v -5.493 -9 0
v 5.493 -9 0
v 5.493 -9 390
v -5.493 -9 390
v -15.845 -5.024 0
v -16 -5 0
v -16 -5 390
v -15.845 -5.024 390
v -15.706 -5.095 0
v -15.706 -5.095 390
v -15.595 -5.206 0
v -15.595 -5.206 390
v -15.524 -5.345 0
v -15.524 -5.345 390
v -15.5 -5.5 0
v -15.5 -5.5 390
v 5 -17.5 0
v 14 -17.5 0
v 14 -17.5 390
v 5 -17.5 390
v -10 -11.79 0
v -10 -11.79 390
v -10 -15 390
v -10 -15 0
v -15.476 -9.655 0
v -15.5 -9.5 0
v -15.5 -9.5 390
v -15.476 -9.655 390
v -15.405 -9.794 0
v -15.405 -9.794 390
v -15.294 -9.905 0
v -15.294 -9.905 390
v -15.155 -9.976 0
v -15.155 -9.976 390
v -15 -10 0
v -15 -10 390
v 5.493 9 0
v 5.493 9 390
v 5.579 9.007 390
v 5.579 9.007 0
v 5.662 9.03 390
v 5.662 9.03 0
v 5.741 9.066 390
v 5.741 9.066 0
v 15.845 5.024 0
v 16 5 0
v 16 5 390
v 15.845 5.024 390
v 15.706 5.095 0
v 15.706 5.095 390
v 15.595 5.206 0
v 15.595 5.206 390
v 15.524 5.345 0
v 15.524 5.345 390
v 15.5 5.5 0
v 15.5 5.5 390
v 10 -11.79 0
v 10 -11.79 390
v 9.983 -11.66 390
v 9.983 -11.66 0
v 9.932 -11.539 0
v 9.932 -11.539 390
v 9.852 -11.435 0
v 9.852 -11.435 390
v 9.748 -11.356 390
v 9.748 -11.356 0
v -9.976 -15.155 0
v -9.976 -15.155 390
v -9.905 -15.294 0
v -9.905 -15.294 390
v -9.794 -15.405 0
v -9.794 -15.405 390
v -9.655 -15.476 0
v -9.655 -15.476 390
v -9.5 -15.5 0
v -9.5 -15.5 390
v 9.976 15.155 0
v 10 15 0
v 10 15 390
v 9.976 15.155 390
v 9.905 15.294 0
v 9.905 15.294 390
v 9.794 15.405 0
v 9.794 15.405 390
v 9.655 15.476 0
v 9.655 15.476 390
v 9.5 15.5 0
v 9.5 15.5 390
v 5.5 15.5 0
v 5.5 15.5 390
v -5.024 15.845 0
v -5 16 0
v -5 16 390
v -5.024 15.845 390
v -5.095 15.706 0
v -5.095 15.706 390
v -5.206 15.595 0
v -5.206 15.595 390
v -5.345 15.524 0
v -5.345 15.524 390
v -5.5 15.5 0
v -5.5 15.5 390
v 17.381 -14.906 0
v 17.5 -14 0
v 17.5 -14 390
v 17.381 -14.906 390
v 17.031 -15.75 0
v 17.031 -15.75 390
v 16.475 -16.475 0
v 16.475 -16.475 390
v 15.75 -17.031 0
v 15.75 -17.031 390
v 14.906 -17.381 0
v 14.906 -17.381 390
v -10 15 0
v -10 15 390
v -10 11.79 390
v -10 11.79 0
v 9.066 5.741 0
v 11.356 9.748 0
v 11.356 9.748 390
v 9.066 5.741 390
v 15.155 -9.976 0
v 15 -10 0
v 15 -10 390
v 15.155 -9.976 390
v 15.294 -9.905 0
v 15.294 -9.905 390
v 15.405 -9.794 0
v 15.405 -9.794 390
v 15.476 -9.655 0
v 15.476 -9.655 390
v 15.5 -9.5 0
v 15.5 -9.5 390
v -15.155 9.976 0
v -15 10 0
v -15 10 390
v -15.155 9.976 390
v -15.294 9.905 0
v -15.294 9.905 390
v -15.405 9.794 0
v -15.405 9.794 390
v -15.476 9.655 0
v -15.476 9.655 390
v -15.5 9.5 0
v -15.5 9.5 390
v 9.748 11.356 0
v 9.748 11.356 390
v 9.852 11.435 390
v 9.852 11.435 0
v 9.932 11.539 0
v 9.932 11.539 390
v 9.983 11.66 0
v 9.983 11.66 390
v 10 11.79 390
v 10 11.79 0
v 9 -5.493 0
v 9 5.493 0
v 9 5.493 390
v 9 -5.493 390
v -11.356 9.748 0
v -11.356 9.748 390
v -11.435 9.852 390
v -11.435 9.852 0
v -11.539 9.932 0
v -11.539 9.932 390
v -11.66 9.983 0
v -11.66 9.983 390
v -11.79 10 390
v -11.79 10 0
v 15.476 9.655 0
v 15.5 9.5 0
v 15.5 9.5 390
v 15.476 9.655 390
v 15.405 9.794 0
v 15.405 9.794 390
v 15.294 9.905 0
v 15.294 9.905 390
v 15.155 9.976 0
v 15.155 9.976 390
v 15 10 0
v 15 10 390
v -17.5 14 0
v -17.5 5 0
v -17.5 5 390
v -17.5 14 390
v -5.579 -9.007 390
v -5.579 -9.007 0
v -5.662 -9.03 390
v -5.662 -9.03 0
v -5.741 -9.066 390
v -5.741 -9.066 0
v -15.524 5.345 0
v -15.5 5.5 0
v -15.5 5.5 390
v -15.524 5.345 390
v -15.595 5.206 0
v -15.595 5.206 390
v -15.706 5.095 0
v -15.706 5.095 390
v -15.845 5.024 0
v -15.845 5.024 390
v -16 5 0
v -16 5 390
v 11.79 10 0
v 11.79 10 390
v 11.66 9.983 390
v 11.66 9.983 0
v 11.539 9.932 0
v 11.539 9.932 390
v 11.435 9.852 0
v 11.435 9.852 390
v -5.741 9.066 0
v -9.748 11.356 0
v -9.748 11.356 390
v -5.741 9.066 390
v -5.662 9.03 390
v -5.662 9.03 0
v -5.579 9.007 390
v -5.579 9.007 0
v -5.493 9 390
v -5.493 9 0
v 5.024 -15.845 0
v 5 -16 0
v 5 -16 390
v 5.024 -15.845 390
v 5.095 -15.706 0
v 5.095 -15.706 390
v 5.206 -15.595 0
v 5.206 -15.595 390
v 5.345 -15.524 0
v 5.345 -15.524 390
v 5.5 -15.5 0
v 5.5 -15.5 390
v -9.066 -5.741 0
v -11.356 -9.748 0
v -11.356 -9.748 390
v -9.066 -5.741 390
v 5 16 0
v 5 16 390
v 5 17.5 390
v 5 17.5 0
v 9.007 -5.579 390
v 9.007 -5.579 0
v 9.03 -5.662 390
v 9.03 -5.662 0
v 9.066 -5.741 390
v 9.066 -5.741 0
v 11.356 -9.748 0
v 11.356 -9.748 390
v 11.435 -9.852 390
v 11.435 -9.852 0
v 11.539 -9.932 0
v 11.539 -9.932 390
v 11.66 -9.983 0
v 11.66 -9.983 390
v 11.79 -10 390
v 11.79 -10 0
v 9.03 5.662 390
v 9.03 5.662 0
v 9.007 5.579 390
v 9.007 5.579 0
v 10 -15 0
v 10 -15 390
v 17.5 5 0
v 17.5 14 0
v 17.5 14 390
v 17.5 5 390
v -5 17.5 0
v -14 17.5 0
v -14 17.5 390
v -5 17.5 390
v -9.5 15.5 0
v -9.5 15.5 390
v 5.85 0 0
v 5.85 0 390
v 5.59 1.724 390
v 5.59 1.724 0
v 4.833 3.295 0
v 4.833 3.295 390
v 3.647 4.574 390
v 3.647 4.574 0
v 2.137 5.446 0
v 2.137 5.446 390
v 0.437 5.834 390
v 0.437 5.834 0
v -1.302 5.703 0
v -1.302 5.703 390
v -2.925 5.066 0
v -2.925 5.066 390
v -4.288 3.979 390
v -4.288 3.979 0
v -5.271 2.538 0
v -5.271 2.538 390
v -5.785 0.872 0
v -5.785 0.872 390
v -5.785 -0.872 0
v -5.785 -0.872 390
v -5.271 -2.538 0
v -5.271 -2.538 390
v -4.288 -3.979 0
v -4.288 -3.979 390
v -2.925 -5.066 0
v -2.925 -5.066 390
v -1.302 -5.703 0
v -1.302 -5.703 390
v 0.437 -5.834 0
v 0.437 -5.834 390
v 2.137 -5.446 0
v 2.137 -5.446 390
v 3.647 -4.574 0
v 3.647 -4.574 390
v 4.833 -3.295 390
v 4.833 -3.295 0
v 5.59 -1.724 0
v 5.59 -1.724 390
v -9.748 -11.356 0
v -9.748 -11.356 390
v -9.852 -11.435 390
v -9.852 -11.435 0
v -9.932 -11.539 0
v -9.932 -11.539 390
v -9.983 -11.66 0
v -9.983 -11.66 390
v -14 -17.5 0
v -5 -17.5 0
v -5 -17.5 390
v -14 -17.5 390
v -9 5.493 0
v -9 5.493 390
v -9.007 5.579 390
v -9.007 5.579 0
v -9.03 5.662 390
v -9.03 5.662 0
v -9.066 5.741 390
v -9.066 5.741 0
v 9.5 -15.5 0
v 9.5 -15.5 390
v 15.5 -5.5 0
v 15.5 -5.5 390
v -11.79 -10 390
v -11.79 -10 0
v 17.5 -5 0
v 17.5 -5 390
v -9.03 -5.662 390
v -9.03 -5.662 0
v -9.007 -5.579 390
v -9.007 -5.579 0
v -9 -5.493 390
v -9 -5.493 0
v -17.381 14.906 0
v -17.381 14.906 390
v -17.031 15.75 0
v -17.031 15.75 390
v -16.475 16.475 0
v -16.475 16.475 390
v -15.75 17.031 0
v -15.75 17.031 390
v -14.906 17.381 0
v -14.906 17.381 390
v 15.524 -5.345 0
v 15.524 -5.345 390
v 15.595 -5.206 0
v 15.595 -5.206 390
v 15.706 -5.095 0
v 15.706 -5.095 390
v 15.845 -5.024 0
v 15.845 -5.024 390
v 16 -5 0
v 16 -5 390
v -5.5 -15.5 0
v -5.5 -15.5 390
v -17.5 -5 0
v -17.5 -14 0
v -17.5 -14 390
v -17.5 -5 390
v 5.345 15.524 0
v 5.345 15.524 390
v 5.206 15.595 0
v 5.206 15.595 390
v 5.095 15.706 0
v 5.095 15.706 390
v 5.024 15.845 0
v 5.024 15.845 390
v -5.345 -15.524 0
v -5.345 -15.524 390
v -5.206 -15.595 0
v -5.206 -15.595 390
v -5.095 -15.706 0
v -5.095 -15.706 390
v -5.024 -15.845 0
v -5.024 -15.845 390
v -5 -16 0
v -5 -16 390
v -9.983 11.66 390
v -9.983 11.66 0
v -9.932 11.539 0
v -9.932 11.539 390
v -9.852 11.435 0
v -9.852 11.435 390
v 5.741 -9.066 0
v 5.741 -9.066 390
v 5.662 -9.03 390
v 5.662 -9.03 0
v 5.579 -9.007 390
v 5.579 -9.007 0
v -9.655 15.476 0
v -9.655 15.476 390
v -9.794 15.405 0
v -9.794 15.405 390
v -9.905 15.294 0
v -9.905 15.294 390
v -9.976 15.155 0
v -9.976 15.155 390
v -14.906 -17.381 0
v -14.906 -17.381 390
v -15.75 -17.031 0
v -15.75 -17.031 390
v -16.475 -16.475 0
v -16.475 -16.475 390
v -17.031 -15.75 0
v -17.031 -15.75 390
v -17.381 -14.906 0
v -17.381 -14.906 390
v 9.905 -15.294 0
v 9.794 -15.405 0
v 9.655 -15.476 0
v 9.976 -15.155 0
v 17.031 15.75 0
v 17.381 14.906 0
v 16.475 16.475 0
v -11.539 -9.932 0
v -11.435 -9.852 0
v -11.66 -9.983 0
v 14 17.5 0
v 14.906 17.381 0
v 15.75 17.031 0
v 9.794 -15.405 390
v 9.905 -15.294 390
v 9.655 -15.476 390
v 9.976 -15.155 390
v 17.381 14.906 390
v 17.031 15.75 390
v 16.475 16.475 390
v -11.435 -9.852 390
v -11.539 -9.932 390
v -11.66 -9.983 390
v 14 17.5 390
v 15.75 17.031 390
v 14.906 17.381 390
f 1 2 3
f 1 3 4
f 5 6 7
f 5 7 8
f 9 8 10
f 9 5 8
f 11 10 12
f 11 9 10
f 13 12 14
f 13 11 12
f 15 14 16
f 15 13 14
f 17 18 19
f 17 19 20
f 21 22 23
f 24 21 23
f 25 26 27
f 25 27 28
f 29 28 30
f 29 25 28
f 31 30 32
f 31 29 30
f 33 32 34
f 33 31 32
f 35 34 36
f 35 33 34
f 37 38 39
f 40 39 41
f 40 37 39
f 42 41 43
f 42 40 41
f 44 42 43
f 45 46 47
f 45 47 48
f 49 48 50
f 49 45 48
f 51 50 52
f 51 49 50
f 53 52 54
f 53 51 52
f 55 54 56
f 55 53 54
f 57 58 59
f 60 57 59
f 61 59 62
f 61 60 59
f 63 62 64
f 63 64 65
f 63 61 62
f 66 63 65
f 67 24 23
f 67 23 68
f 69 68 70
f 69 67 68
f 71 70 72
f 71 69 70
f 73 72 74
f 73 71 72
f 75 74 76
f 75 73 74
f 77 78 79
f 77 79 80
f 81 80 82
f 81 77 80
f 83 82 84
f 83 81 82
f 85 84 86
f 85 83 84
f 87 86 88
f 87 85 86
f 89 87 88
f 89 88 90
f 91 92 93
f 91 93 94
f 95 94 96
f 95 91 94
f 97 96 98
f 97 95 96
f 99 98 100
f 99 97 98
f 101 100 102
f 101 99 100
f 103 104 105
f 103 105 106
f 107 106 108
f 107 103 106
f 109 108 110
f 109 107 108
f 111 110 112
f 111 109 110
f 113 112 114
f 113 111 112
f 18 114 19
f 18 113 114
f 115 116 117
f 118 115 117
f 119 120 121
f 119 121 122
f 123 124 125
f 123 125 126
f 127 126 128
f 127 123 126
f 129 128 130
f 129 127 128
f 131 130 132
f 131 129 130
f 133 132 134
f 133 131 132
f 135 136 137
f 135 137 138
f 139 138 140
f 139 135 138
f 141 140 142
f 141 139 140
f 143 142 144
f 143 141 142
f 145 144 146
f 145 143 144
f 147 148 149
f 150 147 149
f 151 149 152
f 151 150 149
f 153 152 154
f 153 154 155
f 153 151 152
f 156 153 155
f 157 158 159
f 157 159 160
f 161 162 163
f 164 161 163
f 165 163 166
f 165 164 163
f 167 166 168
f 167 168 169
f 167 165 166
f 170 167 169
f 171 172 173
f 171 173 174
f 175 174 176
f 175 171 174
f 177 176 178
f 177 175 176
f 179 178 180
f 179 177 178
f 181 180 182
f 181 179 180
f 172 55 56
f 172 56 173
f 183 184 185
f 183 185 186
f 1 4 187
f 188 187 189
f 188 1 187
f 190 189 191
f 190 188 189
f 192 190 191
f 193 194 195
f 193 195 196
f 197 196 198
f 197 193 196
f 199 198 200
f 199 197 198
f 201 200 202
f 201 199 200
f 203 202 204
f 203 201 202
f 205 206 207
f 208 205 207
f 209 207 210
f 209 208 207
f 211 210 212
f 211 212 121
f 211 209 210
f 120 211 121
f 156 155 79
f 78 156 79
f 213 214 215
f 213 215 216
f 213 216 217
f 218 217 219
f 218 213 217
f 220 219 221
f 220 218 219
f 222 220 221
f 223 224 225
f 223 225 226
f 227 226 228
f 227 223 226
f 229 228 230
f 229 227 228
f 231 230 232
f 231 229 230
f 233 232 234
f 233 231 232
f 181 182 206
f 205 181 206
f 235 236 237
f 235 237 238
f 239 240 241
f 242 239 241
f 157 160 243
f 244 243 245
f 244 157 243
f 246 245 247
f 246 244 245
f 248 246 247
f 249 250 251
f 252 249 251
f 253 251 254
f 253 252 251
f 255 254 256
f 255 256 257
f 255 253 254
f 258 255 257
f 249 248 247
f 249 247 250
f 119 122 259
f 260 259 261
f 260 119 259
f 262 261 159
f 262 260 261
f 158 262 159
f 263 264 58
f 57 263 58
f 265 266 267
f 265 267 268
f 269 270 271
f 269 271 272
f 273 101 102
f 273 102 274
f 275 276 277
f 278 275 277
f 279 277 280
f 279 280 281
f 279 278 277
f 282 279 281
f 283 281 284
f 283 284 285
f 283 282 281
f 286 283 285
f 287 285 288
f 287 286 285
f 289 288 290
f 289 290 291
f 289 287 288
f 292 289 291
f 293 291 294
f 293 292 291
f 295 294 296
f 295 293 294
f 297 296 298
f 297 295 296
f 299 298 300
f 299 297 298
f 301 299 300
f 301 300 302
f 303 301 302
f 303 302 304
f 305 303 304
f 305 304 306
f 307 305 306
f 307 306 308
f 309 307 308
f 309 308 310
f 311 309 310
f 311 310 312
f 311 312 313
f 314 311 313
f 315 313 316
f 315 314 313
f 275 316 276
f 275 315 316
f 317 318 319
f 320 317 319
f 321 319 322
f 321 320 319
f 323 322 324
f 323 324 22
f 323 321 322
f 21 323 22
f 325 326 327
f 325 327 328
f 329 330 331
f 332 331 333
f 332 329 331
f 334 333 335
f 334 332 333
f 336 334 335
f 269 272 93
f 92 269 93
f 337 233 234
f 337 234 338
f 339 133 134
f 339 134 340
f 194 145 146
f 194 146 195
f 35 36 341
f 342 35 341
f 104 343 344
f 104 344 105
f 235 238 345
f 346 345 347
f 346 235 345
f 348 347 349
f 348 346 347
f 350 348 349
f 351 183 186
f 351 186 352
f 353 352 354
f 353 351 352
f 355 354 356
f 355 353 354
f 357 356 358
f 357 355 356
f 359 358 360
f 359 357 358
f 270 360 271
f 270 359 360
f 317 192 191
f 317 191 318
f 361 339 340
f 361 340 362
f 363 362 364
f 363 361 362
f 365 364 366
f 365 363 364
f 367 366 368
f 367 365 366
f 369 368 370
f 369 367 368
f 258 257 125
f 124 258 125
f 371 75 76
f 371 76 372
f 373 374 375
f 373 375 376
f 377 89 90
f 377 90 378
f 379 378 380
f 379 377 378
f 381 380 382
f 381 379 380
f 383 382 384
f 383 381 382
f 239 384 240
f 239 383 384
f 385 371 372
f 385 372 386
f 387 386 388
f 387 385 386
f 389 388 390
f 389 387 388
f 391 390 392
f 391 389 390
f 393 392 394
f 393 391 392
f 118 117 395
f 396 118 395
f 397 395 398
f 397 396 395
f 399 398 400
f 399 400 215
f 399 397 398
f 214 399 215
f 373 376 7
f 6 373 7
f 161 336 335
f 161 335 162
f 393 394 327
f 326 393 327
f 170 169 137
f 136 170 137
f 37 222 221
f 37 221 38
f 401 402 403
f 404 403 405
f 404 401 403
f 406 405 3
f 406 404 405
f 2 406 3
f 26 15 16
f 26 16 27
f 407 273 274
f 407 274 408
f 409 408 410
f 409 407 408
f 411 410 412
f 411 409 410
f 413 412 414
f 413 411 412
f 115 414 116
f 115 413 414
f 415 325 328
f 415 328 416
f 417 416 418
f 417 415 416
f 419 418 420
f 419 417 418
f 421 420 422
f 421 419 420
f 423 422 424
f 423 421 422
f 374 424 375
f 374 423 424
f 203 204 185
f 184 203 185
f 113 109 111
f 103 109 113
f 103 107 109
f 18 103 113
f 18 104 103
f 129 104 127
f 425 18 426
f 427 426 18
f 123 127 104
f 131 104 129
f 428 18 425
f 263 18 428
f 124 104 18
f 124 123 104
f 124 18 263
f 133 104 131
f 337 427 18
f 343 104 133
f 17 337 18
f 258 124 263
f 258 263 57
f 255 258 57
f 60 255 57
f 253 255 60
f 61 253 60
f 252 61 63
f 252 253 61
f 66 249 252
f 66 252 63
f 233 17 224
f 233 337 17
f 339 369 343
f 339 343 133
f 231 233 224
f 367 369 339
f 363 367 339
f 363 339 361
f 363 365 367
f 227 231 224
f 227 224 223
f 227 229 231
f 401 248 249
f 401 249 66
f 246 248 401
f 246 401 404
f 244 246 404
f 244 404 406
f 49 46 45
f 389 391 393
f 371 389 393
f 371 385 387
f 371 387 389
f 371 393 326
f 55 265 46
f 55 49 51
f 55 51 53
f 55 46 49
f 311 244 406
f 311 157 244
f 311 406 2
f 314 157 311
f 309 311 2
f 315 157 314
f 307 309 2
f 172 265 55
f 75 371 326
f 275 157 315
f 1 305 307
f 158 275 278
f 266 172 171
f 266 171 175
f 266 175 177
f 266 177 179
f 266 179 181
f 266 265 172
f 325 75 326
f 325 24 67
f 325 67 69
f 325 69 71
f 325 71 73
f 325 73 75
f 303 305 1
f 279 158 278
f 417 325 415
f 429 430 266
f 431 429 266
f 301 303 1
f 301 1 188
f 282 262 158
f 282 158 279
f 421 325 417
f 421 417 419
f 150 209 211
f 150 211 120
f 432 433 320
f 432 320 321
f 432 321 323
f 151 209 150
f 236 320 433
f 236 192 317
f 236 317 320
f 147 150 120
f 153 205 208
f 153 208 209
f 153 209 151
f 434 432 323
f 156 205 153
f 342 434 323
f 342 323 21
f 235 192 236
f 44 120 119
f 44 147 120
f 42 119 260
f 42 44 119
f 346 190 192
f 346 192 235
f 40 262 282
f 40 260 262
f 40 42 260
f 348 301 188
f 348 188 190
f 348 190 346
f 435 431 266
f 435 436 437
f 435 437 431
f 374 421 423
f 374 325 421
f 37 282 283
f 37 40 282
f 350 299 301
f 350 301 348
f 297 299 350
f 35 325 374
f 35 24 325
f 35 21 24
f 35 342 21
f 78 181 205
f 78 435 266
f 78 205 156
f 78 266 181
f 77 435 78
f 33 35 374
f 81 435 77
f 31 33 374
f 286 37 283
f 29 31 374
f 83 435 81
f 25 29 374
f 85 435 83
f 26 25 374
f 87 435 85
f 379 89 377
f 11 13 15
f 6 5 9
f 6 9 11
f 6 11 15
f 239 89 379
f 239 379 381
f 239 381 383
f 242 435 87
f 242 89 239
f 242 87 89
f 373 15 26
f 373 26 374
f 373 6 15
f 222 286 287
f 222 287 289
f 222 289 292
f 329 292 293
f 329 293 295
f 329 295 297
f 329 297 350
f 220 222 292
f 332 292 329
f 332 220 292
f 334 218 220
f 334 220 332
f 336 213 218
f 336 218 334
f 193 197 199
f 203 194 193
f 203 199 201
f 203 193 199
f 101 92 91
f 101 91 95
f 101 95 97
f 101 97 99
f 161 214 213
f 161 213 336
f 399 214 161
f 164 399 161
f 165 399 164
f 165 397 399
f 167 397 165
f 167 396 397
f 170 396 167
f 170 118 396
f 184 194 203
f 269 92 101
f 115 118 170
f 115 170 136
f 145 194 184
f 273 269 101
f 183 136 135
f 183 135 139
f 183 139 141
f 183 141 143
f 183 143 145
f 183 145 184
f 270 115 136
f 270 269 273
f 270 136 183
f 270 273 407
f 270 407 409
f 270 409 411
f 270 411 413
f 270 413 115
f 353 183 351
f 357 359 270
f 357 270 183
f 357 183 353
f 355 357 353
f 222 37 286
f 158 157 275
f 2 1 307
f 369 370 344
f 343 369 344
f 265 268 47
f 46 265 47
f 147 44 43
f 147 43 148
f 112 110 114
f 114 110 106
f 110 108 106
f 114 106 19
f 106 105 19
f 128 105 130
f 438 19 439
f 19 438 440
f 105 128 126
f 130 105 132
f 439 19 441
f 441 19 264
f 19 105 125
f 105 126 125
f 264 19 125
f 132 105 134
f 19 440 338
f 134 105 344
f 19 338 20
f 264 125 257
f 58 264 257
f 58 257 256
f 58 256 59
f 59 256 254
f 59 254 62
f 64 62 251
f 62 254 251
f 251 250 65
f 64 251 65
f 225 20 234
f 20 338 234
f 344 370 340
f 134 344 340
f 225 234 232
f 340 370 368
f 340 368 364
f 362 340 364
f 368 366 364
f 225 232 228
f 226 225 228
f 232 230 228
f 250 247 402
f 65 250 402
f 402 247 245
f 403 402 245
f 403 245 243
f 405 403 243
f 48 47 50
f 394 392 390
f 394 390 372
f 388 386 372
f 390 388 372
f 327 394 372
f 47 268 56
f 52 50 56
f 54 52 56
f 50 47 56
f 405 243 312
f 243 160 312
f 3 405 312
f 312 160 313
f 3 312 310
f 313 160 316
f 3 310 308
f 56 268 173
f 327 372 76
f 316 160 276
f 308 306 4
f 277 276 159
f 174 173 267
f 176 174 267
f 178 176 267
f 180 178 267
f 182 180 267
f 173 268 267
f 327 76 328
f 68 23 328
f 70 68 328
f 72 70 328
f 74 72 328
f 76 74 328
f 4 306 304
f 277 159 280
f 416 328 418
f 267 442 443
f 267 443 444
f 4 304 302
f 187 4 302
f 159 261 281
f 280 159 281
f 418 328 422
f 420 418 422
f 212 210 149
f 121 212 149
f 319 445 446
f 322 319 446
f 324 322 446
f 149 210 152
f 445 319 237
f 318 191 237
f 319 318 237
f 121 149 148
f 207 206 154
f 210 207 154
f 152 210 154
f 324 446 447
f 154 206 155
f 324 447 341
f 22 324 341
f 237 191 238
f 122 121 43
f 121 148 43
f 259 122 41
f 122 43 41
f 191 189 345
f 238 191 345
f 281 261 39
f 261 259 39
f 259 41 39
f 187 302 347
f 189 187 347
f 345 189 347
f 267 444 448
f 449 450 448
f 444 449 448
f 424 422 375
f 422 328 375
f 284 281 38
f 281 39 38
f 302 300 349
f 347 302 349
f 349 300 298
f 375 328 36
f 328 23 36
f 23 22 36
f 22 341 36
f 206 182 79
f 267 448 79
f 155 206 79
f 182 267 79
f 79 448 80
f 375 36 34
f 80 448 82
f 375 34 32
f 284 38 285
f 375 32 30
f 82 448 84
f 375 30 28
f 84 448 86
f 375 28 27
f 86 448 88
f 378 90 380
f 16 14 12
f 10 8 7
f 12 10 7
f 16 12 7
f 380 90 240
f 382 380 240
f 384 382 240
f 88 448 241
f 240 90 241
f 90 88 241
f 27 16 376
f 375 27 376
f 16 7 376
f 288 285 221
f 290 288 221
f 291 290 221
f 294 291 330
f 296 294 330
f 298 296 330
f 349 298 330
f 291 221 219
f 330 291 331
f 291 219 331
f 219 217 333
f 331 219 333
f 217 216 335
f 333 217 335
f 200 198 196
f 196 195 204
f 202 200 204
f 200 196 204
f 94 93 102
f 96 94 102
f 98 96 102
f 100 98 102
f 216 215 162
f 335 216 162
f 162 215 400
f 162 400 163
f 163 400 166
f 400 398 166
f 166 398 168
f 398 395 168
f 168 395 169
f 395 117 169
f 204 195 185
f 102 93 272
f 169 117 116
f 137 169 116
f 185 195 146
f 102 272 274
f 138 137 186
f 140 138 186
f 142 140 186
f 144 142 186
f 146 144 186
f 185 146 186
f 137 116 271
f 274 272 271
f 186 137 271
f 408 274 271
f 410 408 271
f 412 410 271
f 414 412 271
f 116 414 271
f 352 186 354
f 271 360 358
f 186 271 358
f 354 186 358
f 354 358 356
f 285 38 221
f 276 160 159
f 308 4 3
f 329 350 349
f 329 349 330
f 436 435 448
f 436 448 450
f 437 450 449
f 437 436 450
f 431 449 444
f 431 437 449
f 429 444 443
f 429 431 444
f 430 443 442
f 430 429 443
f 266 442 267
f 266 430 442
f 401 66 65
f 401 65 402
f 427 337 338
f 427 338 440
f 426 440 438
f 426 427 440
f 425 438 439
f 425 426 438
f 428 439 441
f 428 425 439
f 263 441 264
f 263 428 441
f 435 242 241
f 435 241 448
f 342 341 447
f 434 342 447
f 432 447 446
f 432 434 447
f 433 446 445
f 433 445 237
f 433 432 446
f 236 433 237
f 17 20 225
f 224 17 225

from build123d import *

# Parameters (mm, degrees)
CROQUIS1_R              = 5.85
SALIENTE_EXTRUIR1_DEPTH = 390


with BuildPart() as part:
    # Croquis1 → Saliente-Extruir1 (new body)
    with BuildSketch(Plane.XY):
        with BuildLine():
            Line((-17.5, -5), (-16, -5))
            ThreePointArc((-16, -5), (-15.646446609, -5.146446609), (-15.5, -5.5))
            Line((-15.5, -5.5), (-15.5, -9.5))
            ThreePointArc((-15.5, -9.5), (-15.353553391, -9.853553391), (-15, -10))
            Line((-15, -10), (-11.790147321, -10))
            ThreePointArc((-11.790147321, -10), (-11.539192936, -9.932460283), (-11.356036103, -9.748087586))
            Line((-11.356036103, -9.748087586), (-9.065888782, -5.740718013))
            ThreePointArc((-9.065888782, -5.740718013), (-9.016752854, -5.620974478), (-9, -5.492630427))
            Line((-9, -5.492630427), (-9, 5.492630427))
            ThreePointArc((-9, 5.492630427), (-9.016752854, 5.620974478), (-9.065888782, 5.740718013))
            Line((-9.065888782, 5.740718013), (-11.356036103, 9.748087586))
            ThreePointArc((-11.356036103, 9.748087586), (-11.539192936, 9.932460283), (-11.790147321, 10))
            Line((-11.790147321, 10), (-15, 10))
            ThreePointArc((-15, 10), (-15.353553391, 9.853553391), (-15.5, 9.5))
            Line((-15.5, 9.5), (-15.5, 5.5))
            ThreePointArc((-15.5, 5.5), (-15.646446609, 5.146446609), (-16, 5))
            Line((-16, 5), (-17.5, 5))
            Line((-17.5, 5), (-17.5, 14))
            ThreePointArc((-17.5, 14), (-16.474873734, 16.474873734), (-14, 17.5))
            Line((-14, 17.5), (-5, 17.5))
            Line((-5, 17.5), (-5, 16))
            ThreePointArc((-5, 16), (-5.146446609, 15.646446609), (-5.5, 15.5))
            Line((-5.5, 15.5), (-9.5, 15.5))
            ThreePointArc((-9.5, 15.5), (-9.853553391, 15.353553391), (-10, 15))
            Line((-10, 15), (-10, 11.790147321))
            ThreePointArc((-10, 11.790147321), (-9.932460283, 11.539192936), (-9.748087586, 11.356036103))
            Line((-9.748087586, 11.356036103), (-5.740718013, 9.065888782))
            ThreePointArc((-5.740718013, 9.065888782), (-5.620974478, 9.016752854), (-5.492630427, 9))
            Line((-5.492630427, 9), (5.492630427, 9))
            ThreePointArc((5.492630427, 9), (5.620974478, 9.016752854), (5.740718013, 9.065888782))
            Line((5.740718013, 9.065888782), (9.748087586, 11.356036103))
            ThreePointArc((9.748087586, 11.356036103), (9.932460283, 11.539192936), (10, 11.790147321))
            Line((10, 11.790147321), (10, 15))
            ThreePointArc((10, 15), (9.853553391, 15.353553391), (9.5, 15.5))
            Line((9.5, 15.5), (5.5, 15.5))
            ThreePointArc((5.5, 15.5), (5.146446609, 15.646446609), (5, 16))
            Line((5, 16), (5, 17.5))
            Line((5, 17.5), (14, 17.5))
            ThreePointArc((14, 17.5), (16.474873734, 16.474873734), (17.5, 14))
            Line((17.5, 14), (17.5, 5))
            Line((17.5, 5), (16, 5))
            ThreePointArc((16, 5), (15.646446609, 5.146446609), (15.5, 5.5))
            Line((15.5, 5.5), (15.5, 9.5))
            ThreePointArc((15.5, 9.5), (15.353553391, 9.853553391), (15, 10))
            Line((15, 10), (11.790147321, 10))
            ThreePointArc((11.790147321, 10), (11.539192936, 9.932460283), (11.356036103, 9.748087586))
            Line((11.356036103, 9.748087586), (9.065888782, 5.740718013))
            ThreePointArc((9.065888782, 5.740718013), (9.016752854, 5.620974478), (9, 5.492630427))
            Line((9, 5.492630427), (9, -5.492630427))
            ThreePointArc((9, -5.492630427), (9.016752854, -5.620974478), (9.065888782, -5.740718013))
            Line((9.065888782, -5.740718013), (11.356036103, -9.748087586))
            ThreePointArc((11.356036103, -9.748087586), (11.539192936, -9.932460283), (11.790147321, -10))
            Line((11.790147321, -10), (15, -10))
            ThreePointArc((15, -10), (15.353553391, -9.853553391), (15.5, -9.5))
            Line((15.5, -9.5), (15.5, -5.5))
            ThreePointArc((15.5, -5.5), (15.646446609, -5.146446609), (16, -5))
            Line((16, -5), (17.5, -5))
            Line((17.5, -5), (17.5, -14))
            ThreePointArc((17.5, -14), (16.474873734, -16.474873734), (14, -17.5))
            Line((14, -17.5), (5, -17.5))
            Line((5, -17.5), (5, -16))
            ThreePointArc((5, -16), (5.146446609, -15.646446609), (5.5, -15.5))
            Line((5.5, -15.5), (9.5, -15.5))
            ThreePointArc((9.5, -15.5), (9.853553391, -15.353553391), (10, -15))
            Line((10, -15), (10, -11.790147321))
            ThreePointArc((10, -11.790147321), (9.932460283, -11.539192936), (9.748087586, -11.356036103))
            Line((9.748087586, -11.356036103), (5.740718013, -9.065888782))
            ThreePointArc((5.740718013, -9.065888782), (5.620974478, -9.016752854), (5.492630427, -9))
            Line((5.492630427, -9), (-5.492630427, -9))
            ThreePointArc((-5.492630427, -9), (-5.620974478, -9.016752854), (-5.740718013, -9.065888782))
            Line((-5.740718013, -9.065888782), (-9.748087586, -11.356036103))
            ThreePointArc((-9.748087586, -11.356036103), (-9.932460283, -11.539192936), (-10, -11.790147321))
            Line((-10, -11.790147321), (-10, -15))
            ThreePointArc((-10, -15), (-9.853553391, -15.353553391), (-9.5, -15.5))
            Line((-9.5, -15.5), (-5.5, -15.5))
            ThreePointArc((-5.5, -15.5), (-5.146446609, -15.646446609), (-5, -16))
            Line((-5, -16), (-5, -17.5))
            Line((-5, -17.5), (-14, -17.5))
            ThreePointArc((-14, -17.5), (-16.474873734, -16.474873734), (-17.5, -14))
            Line((-17.5, -14), (-17.5, -5))
        make_face()
        Circle(CROQUIS1_R, mode=Mode.SUBTRACT)
    extrude(amount=SALIENTE_EXTRUIR1_DEPTH)


solid = part.part
